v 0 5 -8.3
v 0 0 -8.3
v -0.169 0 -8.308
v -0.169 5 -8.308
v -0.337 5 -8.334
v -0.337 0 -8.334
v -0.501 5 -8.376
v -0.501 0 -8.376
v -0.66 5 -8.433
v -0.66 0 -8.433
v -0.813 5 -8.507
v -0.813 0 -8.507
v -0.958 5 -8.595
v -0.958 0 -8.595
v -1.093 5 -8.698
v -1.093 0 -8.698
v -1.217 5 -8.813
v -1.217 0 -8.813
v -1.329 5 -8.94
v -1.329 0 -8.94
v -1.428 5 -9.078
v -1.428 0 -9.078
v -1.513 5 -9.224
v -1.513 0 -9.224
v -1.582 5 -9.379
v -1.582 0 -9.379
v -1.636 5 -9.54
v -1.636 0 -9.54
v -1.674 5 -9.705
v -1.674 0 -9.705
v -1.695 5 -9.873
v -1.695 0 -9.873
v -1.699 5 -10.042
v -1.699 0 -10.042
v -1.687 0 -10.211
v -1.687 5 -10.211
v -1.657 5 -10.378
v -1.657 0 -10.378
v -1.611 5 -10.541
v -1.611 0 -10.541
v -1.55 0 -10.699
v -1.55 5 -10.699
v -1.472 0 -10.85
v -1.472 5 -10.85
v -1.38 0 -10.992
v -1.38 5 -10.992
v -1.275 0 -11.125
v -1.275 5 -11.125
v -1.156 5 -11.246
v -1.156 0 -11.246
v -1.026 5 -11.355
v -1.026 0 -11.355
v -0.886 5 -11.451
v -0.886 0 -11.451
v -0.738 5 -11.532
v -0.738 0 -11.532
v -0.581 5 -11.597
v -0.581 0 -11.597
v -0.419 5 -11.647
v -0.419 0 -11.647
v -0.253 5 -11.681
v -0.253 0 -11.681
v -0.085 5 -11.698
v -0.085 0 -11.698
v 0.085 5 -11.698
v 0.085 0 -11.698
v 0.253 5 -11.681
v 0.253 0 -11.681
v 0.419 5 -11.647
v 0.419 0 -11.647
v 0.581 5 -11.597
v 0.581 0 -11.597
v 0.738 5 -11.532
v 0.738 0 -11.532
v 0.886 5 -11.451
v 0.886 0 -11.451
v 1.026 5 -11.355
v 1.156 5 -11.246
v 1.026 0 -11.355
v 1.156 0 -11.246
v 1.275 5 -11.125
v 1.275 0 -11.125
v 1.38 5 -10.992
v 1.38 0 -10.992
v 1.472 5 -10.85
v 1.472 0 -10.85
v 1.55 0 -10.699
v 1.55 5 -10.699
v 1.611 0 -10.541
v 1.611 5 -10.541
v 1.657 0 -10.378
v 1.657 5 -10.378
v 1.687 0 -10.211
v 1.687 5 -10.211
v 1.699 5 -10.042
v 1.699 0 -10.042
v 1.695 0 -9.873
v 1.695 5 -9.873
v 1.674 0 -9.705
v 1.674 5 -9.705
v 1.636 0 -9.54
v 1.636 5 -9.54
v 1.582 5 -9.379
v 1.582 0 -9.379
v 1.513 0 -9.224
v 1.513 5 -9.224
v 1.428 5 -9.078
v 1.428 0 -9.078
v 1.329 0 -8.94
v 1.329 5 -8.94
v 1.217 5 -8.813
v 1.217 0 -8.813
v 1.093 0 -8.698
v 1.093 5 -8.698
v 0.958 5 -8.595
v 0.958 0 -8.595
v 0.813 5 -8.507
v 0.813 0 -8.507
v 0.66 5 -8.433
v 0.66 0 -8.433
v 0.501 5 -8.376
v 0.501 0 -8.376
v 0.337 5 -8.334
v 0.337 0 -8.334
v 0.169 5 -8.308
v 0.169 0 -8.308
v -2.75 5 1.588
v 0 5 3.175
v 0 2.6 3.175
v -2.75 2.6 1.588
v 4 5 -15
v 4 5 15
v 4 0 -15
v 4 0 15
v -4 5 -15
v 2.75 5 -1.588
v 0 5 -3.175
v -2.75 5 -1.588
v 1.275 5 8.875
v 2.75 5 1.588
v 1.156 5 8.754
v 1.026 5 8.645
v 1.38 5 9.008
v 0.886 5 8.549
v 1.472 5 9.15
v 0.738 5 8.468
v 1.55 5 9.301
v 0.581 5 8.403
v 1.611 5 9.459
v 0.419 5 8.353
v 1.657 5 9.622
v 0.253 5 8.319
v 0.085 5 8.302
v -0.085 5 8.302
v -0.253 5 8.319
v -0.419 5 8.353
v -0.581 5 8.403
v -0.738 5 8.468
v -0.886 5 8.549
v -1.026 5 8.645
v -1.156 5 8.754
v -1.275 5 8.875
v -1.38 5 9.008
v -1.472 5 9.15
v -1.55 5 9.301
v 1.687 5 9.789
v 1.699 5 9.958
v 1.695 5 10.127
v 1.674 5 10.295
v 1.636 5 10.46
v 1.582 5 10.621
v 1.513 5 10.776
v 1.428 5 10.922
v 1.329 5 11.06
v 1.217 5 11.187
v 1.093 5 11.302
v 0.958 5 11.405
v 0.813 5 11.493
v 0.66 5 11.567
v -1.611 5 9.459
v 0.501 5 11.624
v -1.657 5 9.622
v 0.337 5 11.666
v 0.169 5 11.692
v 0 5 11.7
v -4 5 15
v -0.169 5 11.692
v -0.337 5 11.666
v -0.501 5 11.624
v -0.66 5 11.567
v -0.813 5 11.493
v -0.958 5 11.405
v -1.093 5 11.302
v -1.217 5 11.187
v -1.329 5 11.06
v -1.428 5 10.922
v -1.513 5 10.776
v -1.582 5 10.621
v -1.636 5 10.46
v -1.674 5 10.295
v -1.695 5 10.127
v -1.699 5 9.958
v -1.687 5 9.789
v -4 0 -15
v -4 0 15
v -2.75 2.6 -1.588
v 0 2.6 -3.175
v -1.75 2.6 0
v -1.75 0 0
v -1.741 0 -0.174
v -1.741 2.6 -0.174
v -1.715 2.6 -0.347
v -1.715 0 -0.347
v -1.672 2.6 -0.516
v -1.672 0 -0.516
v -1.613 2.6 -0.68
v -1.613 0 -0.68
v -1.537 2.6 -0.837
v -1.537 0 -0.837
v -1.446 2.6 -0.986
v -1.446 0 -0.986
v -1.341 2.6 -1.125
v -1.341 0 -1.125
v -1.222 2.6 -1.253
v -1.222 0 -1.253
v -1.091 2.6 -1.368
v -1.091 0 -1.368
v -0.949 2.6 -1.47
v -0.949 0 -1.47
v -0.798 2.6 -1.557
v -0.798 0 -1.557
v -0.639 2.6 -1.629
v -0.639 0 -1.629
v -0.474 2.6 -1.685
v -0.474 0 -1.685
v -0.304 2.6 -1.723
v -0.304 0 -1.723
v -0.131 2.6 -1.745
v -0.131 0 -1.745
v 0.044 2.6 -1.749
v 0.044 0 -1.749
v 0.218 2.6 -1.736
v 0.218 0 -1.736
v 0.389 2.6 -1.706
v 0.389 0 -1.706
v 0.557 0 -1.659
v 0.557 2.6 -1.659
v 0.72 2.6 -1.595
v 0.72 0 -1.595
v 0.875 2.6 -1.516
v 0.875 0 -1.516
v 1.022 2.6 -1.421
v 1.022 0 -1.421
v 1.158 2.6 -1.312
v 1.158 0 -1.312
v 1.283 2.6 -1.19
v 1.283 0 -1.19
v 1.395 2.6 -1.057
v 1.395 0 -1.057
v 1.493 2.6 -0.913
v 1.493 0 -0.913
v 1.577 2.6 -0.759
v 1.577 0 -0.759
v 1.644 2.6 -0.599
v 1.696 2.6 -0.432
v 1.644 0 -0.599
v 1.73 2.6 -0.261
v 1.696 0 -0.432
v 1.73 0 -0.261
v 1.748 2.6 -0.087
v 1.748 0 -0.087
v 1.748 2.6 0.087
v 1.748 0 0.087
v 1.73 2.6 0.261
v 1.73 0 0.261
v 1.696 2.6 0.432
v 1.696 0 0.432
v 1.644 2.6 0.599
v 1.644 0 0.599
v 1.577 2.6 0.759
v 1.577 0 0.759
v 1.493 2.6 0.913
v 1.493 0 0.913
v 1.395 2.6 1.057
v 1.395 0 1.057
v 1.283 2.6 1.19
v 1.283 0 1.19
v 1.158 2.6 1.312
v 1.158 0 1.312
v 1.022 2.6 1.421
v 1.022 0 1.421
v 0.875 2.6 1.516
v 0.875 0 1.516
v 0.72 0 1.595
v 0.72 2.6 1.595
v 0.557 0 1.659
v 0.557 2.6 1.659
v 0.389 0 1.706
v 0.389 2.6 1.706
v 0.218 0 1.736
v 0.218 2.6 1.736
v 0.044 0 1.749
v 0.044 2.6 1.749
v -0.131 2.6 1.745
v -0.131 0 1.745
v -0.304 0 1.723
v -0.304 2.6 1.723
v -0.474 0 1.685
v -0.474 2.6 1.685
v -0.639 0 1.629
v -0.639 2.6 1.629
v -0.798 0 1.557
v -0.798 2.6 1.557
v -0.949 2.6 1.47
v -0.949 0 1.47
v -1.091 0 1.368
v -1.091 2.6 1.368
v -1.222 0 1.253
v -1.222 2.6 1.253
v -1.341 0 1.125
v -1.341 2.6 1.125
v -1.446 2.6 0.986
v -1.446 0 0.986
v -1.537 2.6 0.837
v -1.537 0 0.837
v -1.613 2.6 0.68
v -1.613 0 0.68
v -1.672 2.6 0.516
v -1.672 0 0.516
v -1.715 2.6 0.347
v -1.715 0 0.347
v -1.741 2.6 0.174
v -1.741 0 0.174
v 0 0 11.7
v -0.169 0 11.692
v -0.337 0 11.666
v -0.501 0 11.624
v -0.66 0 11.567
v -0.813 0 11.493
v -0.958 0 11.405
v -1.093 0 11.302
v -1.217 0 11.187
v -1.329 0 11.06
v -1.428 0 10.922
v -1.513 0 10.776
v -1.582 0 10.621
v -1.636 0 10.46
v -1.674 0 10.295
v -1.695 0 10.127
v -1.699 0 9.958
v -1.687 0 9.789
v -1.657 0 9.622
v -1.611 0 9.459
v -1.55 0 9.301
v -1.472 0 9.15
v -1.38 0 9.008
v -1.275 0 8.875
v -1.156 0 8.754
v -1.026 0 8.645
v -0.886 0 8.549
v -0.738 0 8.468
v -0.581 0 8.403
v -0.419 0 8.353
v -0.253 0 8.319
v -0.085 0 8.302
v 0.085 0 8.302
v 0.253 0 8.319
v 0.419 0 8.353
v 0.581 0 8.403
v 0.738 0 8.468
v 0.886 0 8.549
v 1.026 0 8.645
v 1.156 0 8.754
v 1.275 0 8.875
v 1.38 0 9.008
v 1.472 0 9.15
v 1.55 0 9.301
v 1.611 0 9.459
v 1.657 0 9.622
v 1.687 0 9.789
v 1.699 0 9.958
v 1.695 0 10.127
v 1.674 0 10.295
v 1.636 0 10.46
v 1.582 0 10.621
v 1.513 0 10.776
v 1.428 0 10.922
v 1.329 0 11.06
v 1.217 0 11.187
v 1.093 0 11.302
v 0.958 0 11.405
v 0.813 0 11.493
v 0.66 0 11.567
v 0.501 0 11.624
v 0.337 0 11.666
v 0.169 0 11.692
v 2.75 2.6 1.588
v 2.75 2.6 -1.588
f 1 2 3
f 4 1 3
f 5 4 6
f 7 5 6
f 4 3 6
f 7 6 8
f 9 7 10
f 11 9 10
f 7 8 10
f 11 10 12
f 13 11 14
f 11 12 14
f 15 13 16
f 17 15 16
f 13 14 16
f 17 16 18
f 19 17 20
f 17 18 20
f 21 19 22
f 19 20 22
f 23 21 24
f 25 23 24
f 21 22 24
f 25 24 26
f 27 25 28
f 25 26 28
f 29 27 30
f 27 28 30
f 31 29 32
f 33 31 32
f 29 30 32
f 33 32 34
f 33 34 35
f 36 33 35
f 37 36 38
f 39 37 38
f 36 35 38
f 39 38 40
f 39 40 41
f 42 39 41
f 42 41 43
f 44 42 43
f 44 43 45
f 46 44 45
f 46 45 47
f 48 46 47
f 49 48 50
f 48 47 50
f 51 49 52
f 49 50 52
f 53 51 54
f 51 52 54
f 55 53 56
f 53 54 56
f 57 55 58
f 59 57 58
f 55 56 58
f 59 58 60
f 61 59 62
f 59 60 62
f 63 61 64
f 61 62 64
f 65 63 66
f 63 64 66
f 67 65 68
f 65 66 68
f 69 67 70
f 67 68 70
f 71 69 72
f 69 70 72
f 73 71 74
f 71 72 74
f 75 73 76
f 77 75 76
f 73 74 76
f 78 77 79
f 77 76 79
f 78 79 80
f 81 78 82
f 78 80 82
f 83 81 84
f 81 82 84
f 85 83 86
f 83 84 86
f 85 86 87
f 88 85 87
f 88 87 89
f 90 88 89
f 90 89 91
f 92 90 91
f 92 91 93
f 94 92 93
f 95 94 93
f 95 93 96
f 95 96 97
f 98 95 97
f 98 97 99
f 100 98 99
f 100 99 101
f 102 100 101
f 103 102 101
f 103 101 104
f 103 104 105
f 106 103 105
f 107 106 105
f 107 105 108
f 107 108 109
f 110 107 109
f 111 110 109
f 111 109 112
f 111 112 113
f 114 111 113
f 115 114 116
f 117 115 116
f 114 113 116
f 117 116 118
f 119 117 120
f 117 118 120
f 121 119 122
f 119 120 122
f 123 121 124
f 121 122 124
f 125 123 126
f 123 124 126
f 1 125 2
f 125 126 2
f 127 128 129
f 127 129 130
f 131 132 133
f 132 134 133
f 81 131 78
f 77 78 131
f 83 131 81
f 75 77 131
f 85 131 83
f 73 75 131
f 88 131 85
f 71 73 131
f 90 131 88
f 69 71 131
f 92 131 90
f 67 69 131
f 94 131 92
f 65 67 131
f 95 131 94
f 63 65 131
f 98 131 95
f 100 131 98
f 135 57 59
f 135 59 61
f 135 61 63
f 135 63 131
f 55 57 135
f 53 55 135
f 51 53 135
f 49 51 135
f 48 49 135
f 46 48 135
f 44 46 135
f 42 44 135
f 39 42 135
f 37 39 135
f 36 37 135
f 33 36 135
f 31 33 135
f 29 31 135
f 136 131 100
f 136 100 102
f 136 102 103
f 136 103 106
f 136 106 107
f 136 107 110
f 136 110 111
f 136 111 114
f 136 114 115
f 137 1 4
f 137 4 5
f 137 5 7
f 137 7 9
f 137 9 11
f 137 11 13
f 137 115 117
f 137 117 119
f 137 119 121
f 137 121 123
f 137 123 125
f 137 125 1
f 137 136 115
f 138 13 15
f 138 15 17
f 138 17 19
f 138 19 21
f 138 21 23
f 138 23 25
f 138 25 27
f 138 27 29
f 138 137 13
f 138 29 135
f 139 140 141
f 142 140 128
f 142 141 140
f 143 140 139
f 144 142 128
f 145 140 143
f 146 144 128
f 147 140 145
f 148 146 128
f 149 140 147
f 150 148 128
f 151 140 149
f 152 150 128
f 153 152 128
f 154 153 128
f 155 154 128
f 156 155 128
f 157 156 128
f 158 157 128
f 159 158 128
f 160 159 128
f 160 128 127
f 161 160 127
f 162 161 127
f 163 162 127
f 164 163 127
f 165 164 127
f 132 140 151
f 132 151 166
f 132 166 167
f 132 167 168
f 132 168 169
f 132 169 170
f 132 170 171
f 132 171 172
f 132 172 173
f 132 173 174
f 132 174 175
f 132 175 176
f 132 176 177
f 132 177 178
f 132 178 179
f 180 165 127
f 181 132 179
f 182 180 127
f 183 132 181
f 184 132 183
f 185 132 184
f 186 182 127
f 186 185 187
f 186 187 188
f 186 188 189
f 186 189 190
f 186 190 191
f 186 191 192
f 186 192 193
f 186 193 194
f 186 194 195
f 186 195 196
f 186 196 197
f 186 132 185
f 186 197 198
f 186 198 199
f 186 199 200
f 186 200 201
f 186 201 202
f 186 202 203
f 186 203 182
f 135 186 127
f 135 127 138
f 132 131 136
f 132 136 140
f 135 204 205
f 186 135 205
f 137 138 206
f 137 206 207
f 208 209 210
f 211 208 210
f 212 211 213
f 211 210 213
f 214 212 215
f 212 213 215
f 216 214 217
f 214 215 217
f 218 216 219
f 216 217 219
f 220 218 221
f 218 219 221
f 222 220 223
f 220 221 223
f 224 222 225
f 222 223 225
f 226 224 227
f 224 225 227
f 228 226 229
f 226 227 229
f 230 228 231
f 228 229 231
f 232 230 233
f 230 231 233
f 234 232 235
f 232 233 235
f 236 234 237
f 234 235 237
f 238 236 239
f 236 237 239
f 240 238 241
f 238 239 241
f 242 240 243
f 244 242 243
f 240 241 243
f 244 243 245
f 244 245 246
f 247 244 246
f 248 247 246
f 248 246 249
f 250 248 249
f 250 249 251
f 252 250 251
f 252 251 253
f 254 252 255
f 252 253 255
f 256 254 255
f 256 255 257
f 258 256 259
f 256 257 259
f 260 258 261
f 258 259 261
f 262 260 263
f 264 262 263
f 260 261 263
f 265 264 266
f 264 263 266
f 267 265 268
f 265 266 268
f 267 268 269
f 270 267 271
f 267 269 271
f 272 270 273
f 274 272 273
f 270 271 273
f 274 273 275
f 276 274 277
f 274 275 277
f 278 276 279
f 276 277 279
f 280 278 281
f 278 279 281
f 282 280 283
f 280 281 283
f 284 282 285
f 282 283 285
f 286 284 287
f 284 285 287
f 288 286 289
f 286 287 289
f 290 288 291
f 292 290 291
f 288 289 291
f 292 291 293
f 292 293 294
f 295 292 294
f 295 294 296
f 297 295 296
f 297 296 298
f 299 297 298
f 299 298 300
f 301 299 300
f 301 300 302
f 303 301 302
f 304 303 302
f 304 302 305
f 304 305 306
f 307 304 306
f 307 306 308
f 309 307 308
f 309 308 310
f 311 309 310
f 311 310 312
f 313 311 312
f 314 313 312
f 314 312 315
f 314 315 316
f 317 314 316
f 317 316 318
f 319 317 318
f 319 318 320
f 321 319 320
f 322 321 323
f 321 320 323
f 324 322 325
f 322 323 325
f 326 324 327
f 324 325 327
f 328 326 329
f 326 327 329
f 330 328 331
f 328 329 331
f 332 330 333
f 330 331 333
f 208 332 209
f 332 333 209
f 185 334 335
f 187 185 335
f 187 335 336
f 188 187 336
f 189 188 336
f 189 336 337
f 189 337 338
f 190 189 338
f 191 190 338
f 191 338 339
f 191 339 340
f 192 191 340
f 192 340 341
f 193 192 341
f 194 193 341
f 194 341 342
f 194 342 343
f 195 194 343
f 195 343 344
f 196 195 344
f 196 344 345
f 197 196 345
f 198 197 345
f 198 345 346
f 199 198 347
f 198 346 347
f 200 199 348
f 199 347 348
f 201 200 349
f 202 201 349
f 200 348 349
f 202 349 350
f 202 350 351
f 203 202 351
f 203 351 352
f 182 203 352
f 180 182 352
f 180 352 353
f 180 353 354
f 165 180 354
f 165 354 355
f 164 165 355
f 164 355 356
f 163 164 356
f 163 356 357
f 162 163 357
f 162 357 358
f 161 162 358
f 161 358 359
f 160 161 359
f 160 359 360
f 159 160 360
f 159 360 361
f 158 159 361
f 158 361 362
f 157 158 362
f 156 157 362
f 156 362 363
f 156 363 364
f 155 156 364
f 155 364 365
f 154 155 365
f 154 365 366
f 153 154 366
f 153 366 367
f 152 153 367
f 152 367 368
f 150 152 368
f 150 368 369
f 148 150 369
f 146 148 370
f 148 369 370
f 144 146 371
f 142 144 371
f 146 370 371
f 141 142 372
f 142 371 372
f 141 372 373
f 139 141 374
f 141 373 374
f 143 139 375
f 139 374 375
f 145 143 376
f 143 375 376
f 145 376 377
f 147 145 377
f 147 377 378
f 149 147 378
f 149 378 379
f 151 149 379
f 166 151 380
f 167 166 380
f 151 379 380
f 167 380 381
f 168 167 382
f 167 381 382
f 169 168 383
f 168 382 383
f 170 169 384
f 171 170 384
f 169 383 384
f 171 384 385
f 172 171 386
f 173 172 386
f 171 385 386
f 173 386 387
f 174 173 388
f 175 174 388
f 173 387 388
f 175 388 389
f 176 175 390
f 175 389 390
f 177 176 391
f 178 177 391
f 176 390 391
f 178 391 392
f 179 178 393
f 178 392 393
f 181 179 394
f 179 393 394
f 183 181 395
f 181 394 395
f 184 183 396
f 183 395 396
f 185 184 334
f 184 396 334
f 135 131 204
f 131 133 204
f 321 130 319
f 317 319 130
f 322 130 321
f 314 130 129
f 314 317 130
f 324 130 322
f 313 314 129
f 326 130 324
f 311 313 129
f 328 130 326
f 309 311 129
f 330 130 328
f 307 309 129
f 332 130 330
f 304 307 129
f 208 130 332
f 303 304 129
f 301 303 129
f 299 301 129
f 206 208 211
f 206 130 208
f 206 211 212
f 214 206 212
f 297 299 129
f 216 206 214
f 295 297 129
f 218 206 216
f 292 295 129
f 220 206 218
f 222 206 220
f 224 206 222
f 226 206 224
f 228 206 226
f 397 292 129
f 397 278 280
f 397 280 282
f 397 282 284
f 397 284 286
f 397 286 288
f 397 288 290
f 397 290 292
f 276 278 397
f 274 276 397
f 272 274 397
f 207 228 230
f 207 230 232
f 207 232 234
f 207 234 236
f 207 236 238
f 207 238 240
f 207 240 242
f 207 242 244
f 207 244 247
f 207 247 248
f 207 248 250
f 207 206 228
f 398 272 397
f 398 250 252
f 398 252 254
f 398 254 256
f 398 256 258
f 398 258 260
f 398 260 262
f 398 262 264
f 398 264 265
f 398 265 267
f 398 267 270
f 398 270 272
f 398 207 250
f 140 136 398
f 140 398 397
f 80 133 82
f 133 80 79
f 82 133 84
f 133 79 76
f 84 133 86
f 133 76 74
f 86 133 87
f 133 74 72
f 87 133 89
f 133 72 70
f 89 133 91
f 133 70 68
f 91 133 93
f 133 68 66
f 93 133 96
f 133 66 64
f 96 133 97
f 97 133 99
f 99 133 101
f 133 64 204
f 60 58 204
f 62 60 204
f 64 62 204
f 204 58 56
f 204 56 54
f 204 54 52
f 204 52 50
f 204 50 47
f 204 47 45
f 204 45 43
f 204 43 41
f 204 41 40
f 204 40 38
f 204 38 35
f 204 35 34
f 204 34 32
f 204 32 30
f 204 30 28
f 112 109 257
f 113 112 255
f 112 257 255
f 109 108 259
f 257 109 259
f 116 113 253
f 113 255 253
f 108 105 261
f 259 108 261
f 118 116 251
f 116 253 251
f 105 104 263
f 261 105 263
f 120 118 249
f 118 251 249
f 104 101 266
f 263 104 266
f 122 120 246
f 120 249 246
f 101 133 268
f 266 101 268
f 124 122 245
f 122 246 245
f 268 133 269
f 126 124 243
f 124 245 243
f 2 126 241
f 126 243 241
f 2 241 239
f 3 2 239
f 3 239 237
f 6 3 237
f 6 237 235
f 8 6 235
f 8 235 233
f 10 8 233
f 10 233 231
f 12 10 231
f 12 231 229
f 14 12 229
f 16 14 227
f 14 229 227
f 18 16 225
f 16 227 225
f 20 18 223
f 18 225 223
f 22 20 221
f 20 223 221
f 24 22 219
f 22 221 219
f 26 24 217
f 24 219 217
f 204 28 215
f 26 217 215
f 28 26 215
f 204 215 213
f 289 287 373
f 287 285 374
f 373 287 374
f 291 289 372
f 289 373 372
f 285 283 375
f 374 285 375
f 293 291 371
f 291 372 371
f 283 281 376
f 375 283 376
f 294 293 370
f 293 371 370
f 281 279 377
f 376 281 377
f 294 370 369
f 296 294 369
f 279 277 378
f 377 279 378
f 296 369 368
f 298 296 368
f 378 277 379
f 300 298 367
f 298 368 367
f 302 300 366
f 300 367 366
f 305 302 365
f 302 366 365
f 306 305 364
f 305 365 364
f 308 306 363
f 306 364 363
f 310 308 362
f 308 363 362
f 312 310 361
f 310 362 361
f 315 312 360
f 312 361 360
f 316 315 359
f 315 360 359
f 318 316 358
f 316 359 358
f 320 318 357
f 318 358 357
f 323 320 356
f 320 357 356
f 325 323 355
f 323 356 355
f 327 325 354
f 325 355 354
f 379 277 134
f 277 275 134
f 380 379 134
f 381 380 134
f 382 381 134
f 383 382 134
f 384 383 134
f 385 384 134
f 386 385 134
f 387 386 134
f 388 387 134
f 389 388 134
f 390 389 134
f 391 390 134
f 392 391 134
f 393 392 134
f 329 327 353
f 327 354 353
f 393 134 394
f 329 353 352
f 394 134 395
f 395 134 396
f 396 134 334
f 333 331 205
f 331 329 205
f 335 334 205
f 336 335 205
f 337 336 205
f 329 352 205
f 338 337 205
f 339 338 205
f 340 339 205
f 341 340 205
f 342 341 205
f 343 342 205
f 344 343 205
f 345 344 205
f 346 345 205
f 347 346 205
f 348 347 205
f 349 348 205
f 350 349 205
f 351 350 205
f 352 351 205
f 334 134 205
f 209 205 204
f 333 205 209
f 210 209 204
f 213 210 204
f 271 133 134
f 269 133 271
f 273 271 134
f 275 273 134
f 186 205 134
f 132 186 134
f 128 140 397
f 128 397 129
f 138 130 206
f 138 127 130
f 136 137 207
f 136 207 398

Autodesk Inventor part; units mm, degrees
ref_plane "YZ Plane" through (0, 0, 0) normal (1, 0, 0) x (0, 1, 0)
ref_plane "XZ Plane" through (0, 0, 0) normal (0, 1, 0) x (-1, 0, 0)
ref_plane "XY Plane" through (0, 0, 0) normal (0, 0, 1) x (1, 0, 0)
sketch "Sketch1" plane through (0, 0, 0) normal (0, 1, 0) x (-1, 0, 0)
  line L0 (-4, -15) -> (4, -15)
  line L1 (4, -15) -> (4, 15)
  line L2 (4, 15) -> (-4, 15)
  line L3 (-4, 15) -> (-4, -15)
  line L4 (-4, -15) -> (4, 15) construction
  line L5 (4, -15) -> (-4, 15) construction
  circle A0 centre (0, 0) radius 1.75
  dimension "d0" = 8
  dimension "d1" = 30
  dimension "d2" = 3.5
extrude "Extrusion1" add sketch "Sketch1" along normal blind 5
sketch "Sketch2" plane through (0, 5, 0) normal (0, 1, 0) x (1, 0, 0)
  circle A0 centre (0, 0) radius 1.75 projected
  circle A1 centre (0, 0) radius 2.75 construction
  line L0 (-2.75, 1.5877) -> (0, 3.1754)
  line L1 (0, 3.1754) -> (2.75, 1.5877)
  line L2 (2.75, 1.5877) -> (2.75, -1.5877)
  line L3 (2.75, -1.5877) -> (0, -3.1754)
  line L4 (0, -3.1754) -> (-2.75, -1.5877)
  line L5 (-2.75, -1.5877) -> (-2.75, 1.5877)
  point P0 (-2.75, 0)
  dimension "d5" = 5.5
extrude "Extrusion2" cut sketch "Sketch2" against normal blind 2.4 contours A0 | L0 L1 L2 L3 L4 L5
sketch "Sketch3" plane through (0, 5, 0) normal (0, 1, 0) x (1, 0, 0)
  line L0 (-4, -15) -> (4, -15) projected
  line L1 (0, -15) -> (0, 15) construction
  line L2 (4, 15) -> (-4, 15) projected
  point P0 (0, 0)
  point P1 (0, -10)
  point P2 (0, 10)
  dimension "d8" = 5
  dimension "d9" = 5
hole "Hole1" at (0, 5, 10) at (0, 5, -10) direction (0, -1, 0) diameter 3.4 end through all clearance for "Countersunk Flat Head Screw ISO 2009/7046" size "M3" standard "ISO"
properties part number "turning clip bottom"
